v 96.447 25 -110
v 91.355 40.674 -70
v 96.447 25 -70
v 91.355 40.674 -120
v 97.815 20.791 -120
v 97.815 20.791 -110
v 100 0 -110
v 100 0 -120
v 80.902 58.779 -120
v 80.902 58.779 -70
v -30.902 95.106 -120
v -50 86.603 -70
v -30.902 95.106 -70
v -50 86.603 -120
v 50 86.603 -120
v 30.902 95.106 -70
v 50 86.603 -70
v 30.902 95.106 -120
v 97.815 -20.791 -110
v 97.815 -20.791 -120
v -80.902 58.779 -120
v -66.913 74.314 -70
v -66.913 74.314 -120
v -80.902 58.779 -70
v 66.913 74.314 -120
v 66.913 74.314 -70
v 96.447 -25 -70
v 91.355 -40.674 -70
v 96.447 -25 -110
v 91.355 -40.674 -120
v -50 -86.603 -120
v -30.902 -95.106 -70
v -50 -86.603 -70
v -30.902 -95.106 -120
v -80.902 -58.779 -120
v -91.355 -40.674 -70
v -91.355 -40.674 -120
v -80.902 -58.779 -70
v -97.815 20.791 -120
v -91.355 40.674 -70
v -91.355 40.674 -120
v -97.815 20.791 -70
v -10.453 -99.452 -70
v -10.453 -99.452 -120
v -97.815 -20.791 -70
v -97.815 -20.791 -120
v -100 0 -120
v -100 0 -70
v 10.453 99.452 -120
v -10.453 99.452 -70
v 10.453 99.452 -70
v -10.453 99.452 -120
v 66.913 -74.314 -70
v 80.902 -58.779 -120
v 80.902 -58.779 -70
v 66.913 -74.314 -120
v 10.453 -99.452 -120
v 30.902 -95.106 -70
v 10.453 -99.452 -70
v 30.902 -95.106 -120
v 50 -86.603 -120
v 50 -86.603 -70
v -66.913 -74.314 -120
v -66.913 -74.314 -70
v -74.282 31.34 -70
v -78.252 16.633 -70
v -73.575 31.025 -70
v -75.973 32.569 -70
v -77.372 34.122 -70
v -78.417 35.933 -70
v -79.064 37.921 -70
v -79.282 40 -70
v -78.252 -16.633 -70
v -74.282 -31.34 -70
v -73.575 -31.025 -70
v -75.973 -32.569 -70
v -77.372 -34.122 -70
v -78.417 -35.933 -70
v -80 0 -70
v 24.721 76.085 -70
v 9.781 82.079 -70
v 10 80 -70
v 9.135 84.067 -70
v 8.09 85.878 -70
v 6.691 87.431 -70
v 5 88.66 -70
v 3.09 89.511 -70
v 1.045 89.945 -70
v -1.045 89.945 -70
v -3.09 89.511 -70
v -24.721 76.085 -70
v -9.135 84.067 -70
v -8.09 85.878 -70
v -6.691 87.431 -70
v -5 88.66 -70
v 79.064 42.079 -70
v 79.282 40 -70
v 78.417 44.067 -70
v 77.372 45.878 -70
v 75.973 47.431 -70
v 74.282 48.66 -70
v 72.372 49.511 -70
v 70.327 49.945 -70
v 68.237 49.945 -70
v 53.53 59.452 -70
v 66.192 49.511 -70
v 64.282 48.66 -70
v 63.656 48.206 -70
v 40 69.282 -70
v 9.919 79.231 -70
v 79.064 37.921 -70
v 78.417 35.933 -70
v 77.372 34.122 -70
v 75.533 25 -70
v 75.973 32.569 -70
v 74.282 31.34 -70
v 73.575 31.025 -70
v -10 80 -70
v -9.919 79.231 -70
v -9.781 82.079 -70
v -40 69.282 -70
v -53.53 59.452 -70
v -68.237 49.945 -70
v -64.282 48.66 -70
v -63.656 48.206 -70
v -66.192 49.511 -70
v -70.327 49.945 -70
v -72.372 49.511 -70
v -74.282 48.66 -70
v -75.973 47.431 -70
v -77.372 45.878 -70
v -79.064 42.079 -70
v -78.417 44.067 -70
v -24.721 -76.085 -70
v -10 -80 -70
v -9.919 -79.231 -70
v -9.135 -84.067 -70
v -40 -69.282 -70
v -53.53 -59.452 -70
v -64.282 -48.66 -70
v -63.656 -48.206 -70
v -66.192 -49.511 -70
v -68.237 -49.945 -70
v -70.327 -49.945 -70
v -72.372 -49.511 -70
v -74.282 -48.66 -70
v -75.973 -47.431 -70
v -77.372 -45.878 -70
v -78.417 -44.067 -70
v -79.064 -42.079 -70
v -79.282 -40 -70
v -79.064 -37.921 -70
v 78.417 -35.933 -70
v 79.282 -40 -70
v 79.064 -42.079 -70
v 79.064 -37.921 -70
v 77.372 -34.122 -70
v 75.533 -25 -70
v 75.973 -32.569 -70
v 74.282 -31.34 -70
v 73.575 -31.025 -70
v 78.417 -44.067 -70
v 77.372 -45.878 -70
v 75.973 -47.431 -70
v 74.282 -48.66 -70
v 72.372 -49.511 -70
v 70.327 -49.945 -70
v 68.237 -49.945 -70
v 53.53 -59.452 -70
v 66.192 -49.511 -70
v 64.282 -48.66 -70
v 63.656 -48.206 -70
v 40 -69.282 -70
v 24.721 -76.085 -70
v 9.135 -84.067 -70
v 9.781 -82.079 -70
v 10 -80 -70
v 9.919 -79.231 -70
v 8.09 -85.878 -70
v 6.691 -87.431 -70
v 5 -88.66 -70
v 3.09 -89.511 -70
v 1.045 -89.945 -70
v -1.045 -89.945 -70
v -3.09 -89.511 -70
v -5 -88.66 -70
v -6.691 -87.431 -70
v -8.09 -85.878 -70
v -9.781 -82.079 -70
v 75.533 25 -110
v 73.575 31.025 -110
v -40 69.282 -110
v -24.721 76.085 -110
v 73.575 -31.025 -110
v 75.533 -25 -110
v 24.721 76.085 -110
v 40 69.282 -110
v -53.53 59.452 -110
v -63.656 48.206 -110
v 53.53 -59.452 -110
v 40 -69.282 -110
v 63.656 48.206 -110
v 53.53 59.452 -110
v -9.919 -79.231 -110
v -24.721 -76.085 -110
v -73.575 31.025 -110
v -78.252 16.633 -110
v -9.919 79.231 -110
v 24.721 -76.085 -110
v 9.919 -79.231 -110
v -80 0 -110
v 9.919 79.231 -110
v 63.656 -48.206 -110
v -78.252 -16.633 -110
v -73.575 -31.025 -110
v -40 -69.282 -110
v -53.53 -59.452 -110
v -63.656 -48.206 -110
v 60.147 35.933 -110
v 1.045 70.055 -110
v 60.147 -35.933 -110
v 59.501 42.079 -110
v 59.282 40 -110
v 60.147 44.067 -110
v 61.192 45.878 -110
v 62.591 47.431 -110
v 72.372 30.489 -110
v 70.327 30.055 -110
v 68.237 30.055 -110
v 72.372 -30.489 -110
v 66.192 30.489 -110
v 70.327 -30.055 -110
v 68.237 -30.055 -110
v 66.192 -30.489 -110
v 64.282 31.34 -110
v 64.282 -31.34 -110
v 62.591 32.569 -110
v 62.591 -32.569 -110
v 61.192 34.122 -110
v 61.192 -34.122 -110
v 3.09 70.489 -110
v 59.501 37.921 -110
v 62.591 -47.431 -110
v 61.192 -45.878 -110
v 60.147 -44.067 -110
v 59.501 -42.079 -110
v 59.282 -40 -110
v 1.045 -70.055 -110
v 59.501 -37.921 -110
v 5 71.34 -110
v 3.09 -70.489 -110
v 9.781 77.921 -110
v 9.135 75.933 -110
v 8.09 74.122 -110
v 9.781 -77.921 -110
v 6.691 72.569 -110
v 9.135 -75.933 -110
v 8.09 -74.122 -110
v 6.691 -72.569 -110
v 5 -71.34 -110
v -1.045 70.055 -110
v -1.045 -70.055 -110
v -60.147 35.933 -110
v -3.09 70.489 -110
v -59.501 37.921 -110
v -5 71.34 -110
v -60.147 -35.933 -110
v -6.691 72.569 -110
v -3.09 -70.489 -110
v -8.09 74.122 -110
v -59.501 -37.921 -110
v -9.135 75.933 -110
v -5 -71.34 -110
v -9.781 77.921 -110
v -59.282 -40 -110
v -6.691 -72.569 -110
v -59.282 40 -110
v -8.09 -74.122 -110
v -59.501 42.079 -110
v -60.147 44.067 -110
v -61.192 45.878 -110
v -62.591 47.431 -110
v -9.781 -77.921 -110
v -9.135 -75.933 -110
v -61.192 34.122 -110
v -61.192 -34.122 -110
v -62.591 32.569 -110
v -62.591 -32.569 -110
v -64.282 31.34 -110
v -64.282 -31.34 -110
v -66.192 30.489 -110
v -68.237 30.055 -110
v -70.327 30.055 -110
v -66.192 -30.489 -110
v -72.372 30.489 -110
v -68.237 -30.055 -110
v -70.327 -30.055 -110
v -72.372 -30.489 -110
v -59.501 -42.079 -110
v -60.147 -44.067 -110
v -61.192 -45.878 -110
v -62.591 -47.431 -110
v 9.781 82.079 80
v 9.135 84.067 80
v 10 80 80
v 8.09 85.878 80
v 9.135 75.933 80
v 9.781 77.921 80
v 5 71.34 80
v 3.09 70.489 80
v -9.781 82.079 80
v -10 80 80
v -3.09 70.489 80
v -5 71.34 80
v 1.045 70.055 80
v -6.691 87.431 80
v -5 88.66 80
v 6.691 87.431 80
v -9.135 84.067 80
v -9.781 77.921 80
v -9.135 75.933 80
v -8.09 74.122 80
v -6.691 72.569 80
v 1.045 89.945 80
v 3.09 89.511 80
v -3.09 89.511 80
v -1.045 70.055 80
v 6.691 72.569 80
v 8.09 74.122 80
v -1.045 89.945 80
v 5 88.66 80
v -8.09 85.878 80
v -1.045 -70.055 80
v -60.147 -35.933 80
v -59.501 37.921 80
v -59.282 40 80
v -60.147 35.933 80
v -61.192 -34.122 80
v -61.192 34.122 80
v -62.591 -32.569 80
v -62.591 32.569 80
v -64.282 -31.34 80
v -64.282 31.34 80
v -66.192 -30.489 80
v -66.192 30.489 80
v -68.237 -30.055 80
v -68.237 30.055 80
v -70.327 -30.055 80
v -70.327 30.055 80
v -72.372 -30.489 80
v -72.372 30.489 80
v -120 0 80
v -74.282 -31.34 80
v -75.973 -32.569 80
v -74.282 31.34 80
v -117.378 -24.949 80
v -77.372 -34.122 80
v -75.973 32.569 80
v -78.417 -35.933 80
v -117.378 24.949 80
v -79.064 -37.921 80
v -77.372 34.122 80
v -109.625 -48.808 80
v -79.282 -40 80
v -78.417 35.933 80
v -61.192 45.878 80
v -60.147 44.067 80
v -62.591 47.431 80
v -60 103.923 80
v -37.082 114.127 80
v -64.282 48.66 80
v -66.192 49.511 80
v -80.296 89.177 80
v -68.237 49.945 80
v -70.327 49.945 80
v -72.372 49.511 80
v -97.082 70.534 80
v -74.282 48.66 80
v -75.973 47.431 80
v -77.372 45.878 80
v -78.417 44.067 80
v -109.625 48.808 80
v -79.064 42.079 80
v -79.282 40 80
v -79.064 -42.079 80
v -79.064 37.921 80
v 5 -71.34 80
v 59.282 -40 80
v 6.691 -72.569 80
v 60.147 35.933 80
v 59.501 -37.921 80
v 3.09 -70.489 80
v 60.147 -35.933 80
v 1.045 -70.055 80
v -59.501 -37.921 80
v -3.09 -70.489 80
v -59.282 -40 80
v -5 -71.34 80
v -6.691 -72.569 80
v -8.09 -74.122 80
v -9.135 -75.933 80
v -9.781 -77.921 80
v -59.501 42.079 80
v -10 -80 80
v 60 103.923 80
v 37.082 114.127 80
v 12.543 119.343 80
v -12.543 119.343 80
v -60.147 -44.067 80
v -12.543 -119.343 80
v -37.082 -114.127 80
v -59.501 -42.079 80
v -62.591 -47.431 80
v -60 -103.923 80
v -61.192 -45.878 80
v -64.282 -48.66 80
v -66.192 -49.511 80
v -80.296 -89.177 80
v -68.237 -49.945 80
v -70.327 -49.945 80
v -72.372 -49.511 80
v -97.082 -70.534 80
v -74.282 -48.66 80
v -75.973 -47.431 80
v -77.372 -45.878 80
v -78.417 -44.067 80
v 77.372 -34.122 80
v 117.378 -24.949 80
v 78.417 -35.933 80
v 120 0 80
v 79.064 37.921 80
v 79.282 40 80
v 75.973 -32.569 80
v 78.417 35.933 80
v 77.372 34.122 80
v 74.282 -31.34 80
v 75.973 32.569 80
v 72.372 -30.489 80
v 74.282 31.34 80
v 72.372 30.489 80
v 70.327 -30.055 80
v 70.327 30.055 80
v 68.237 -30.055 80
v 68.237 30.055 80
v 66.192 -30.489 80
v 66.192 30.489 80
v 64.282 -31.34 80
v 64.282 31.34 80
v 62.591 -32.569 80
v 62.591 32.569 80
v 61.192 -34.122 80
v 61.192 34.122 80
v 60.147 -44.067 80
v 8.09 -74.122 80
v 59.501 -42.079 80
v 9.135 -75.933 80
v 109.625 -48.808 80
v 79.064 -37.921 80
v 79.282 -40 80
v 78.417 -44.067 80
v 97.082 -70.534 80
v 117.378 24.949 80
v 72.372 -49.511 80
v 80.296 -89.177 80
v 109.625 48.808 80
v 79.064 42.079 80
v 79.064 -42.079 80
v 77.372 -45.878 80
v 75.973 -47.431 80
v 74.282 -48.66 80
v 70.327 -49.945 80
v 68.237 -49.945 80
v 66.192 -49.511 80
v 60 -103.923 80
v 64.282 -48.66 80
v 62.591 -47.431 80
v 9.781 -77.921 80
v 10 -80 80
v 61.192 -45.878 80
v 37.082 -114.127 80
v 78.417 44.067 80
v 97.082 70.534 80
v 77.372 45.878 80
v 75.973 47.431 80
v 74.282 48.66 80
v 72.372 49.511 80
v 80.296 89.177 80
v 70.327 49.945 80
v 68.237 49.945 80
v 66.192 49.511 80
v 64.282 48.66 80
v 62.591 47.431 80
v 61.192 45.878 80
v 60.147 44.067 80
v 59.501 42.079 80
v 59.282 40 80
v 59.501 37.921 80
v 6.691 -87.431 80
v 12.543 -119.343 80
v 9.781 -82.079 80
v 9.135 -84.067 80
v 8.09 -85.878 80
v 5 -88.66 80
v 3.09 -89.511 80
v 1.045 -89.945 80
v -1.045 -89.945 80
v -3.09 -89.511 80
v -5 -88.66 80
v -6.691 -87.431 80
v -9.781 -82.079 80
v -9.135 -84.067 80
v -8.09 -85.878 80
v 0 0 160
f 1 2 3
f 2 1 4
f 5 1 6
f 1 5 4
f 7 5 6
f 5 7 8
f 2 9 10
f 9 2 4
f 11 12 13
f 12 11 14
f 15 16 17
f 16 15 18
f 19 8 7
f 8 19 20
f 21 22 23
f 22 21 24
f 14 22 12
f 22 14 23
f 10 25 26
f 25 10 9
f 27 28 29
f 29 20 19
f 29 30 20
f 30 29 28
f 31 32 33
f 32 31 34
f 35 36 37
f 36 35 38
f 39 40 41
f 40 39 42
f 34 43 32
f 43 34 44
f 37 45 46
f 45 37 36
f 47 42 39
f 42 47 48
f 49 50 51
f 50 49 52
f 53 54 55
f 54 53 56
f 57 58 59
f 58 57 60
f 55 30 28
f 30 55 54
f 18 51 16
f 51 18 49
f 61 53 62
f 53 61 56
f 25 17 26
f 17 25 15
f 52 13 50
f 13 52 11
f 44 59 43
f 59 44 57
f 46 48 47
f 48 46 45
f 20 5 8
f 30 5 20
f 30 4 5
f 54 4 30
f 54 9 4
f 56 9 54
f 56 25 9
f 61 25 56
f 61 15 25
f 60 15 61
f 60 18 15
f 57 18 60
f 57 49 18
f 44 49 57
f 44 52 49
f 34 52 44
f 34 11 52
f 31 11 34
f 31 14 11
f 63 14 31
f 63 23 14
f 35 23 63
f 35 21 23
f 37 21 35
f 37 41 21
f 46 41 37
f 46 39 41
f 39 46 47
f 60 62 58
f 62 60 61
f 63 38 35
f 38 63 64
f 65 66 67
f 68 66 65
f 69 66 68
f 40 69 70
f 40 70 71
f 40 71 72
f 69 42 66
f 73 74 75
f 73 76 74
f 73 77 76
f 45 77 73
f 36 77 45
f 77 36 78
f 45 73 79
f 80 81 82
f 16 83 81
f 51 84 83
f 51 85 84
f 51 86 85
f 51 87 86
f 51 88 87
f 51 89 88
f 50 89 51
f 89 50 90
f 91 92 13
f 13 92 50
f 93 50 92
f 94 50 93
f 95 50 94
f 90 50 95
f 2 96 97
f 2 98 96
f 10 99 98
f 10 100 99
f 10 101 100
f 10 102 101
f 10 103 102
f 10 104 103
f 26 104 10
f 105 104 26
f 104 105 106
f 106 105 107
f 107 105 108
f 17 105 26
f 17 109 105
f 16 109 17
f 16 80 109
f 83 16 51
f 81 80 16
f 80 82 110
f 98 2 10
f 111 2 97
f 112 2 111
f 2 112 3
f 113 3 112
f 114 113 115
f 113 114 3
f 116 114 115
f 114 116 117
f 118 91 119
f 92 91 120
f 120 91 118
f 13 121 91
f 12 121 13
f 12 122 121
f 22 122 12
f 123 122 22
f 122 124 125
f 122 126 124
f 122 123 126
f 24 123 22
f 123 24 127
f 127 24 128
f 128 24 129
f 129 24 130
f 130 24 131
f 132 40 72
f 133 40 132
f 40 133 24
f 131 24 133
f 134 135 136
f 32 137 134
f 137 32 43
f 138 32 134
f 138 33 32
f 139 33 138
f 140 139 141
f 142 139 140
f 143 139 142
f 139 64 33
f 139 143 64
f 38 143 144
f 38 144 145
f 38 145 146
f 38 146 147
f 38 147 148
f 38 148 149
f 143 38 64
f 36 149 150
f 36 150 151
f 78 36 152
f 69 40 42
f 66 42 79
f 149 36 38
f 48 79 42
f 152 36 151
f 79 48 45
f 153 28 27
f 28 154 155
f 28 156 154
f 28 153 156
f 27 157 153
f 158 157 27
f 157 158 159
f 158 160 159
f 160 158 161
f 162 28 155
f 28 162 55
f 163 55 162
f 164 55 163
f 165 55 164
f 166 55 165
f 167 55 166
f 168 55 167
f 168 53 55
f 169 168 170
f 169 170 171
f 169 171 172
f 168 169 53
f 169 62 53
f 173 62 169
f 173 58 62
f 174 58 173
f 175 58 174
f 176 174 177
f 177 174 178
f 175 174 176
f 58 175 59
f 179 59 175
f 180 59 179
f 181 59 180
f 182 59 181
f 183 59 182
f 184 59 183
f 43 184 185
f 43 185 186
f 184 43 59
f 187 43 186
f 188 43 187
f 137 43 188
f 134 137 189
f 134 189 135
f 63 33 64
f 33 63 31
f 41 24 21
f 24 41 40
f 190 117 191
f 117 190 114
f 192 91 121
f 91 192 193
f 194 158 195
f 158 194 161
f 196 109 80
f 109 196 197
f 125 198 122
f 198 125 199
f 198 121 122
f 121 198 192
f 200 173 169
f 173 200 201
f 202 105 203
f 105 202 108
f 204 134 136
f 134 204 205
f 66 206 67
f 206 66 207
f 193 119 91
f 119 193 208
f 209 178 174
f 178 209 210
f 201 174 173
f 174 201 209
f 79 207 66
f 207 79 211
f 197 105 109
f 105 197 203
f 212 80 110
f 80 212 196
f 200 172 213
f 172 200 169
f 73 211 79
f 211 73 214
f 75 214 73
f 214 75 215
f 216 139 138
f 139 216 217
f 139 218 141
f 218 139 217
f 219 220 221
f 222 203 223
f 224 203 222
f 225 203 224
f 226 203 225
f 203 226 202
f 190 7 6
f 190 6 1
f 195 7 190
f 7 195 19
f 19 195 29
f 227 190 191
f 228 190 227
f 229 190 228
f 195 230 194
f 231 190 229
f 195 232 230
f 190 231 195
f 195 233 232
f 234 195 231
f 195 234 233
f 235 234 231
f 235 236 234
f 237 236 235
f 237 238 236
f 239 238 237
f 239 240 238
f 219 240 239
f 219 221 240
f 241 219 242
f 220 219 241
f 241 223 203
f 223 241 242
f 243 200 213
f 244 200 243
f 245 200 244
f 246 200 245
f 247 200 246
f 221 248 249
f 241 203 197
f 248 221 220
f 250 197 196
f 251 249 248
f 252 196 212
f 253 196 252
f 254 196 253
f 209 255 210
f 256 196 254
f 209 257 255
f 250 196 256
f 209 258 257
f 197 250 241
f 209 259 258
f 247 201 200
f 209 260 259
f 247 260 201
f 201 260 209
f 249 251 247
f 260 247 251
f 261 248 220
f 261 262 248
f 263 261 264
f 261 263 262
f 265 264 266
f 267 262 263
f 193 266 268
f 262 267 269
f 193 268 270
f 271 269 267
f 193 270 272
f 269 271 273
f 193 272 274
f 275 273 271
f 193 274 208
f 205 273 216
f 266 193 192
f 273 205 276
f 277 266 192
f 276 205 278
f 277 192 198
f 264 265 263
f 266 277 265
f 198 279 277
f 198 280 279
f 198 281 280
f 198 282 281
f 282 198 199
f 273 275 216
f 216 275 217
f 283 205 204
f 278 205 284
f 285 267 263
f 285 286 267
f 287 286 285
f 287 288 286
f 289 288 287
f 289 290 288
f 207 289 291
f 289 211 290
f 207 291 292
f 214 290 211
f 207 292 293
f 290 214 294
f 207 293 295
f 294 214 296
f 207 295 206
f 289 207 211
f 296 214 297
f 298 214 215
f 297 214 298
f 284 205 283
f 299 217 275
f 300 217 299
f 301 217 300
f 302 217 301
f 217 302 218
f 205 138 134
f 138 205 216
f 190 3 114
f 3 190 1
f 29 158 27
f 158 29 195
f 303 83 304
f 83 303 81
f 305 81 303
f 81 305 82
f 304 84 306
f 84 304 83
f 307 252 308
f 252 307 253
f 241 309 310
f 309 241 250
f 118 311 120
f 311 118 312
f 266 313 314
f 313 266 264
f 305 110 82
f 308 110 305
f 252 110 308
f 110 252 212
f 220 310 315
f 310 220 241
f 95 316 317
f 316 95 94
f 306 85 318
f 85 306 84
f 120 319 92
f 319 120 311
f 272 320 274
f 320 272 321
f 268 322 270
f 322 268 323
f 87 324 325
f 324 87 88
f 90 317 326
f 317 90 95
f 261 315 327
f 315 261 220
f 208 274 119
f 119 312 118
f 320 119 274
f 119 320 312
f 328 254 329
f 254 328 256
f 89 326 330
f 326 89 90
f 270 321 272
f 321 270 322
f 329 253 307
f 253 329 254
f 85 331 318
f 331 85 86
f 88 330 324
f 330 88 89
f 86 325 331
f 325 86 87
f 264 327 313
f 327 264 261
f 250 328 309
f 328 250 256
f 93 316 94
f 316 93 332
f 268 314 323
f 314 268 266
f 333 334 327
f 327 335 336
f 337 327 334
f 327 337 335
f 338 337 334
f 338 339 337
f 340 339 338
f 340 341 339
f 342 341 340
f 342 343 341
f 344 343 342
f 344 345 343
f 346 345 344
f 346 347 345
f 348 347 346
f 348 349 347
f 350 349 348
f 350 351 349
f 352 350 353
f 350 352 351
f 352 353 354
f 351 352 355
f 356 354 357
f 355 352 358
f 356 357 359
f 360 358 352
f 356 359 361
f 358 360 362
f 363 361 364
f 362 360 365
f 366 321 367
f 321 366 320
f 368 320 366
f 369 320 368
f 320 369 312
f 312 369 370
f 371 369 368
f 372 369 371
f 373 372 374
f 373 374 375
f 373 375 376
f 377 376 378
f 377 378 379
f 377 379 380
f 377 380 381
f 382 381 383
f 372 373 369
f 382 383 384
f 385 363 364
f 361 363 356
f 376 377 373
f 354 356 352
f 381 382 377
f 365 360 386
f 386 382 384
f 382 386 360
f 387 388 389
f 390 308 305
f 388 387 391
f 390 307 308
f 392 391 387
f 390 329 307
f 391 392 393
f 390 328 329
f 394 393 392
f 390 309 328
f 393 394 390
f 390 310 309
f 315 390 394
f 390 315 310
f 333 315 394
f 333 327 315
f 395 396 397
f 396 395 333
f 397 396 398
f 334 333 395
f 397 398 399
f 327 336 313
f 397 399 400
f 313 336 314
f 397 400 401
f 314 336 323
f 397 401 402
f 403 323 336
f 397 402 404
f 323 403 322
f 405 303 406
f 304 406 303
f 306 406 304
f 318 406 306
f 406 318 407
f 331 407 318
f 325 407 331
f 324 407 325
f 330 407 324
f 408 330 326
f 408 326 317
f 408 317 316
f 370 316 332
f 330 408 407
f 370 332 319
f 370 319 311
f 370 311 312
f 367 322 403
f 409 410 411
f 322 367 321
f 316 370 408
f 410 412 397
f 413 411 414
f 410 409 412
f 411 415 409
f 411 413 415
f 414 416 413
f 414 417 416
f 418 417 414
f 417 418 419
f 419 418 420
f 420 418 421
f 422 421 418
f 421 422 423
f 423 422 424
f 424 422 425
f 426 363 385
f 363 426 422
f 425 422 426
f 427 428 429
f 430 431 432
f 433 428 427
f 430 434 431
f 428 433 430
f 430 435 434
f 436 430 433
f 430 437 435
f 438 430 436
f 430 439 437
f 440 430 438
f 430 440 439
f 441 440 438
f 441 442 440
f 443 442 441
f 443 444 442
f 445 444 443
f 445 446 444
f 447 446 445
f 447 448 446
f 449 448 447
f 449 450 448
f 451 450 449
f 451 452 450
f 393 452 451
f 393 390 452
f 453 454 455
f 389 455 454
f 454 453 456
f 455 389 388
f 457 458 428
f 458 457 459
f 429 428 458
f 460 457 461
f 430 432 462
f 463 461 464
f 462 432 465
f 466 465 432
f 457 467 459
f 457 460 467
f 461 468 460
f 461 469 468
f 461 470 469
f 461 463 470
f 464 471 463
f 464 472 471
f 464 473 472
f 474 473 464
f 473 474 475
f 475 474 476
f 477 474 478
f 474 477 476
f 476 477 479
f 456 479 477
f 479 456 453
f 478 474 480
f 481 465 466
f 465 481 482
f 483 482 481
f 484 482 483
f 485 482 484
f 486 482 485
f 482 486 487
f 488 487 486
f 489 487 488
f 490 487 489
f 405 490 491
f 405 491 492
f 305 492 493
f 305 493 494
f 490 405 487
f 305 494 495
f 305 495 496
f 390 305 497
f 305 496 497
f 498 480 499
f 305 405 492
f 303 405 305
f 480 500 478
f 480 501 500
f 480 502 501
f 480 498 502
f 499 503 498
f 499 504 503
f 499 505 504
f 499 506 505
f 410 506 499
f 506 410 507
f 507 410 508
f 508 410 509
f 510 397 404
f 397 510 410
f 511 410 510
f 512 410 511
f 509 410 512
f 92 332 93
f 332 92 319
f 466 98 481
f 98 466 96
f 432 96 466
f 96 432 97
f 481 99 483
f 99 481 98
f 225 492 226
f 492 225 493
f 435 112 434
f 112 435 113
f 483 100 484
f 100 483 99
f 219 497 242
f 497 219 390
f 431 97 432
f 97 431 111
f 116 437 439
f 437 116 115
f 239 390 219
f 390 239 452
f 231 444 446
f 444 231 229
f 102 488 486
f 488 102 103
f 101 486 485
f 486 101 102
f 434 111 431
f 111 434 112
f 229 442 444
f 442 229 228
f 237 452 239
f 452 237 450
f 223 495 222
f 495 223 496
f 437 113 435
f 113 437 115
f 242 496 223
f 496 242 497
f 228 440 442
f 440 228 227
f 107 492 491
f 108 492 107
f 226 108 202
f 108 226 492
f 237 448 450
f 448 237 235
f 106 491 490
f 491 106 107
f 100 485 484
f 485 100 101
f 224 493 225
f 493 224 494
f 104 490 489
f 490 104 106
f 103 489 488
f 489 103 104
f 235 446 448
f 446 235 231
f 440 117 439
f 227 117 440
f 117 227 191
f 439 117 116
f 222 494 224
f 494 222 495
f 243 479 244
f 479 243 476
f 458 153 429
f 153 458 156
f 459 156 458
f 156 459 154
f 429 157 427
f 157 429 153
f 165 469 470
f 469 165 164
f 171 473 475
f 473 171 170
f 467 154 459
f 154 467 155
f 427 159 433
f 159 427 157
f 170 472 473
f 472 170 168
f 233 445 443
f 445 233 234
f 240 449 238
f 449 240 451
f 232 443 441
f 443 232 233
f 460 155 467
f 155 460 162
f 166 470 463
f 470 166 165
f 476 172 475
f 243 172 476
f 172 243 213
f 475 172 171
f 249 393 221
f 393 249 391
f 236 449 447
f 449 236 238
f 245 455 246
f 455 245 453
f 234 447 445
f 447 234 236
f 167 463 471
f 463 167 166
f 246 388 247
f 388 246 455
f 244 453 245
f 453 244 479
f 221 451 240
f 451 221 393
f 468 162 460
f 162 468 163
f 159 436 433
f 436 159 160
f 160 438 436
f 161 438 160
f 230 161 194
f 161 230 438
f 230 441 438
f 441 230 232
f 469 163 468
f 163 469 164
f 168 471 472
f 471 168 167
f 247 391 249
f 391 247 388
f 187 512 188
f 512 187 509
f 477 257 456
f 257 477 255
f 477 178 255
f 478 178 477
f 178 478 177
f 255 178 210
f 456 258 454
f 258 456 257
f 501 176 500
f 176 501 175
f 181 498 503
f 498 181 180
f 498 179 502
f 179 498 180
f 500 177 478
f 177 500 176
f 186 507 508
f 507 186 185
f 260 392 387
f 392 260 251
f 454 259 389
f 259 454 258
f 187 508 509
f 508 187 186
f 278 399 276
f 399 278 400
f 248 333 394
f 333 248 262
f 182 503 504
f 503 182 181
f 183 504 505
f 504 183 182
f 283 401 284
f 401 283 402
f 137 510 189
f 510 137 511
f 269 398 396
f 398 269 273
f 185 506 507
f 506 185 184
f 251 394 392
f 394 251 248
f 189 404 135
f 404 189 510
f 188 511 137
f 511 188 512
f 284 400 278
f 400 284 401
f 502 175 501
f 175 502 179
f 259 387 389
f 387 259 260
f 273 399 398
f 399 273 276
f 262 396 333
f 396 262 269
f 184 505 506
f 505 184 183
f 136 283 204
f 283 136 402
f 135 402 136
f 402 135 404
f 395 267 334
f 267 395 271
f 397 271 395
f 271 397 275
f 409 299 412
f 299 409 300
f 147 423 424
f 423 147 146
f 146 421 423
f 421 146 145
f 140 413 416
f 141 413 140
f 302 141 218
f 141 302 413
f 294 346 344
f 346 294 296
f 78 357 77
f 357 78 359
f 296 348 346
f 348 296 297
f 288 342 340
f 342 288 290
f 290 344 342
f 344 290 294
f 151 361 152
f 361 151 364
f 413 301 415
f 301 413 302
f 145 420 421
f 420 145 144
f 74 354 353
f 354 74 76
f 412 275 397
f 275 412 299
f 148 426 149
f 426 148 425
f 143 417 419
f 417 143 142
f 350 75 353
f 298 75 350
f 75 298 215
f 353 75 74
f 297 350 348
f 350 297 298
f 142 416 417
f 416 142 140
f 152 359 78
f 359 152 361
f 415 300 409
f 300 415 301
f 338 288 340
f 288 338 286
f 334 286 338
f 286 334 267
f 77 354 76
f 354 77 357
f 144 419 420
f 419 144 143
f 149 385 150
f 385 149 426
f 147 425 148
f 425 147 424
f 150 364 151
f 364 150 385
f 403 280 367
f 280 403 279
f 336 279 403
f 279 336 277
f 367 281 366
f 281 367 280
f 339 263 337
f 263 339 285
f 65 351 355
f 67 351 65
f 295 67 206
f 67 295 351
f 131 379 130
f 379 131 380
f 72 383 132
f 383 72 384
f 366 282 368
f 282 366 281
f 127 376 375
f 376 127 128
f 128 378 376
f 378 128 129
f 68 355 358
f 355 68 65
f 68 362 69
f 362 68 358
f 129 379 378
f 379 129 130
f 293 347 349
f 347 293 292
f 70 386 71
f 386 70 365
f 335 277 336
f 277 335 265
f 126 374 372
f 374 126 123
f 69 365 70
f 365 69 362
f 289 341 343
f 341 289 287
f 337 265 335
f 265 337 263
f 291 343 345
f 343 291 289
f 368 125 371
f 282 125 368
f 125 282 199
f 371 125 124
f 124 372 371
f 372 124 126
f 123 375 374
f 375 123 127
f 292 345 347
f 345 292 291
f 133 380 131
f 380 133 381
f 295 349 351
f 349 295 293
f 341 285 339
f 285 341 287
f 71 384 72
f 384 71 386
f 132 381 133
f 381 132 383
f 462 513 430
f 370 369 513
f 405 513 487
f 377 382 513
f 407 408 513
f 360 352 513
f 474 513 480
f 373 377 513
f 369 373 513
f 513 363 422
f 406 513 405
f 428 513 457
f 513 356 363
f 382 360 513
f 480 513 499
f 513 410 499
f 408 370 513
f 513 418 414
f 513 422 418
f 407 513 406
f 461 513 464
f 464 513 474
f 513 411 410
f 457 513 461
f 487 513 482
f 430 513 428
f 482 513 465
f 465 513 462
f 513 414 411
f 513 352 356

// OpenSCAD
// translate.scad - Example for translate() usage in OpenSCAD

echo(version=version());

module example_translate()
{
	translate([0, 0, -120]) {
		difference() {
			cylinder(h = 50, r = 100);
			translate([0, 0, 10]) cylinder(h = 50, r = 80);
			translate([100, 0, 35]) cube(50, center = true);
		}
		for (i = [0:5]) {
			echo(360*i/6, sin(360*i/6)*80, cos(360*i/6)*80);
			translate([sin(360*i/6)*80, cos(360*i/6)*80, 0 ])
				cylinder(h = 200, r=10);
		}
		translate([0, 0, 200])
			cylinder(h = 80, r1 = 120, r2 = 0);
	}
}

example_translate();



// Written by Clifford Wolf &ltclifford@clifford.at> and Marius
// Kintel &ltmarius@kintel.net>
//
// To the extent possible under law, the author(s) have dedicated all
// copyright and related and neighboring rights to this software to the
// public domain worldwide. This software is distributed without any
// warranty.
//
// You should have received a copy of the CC0 Public Domain
// Dedication along with this software.
// If not, see &lthttp://creativecommons.org/publicdomain/zero/1.0/&gt.
